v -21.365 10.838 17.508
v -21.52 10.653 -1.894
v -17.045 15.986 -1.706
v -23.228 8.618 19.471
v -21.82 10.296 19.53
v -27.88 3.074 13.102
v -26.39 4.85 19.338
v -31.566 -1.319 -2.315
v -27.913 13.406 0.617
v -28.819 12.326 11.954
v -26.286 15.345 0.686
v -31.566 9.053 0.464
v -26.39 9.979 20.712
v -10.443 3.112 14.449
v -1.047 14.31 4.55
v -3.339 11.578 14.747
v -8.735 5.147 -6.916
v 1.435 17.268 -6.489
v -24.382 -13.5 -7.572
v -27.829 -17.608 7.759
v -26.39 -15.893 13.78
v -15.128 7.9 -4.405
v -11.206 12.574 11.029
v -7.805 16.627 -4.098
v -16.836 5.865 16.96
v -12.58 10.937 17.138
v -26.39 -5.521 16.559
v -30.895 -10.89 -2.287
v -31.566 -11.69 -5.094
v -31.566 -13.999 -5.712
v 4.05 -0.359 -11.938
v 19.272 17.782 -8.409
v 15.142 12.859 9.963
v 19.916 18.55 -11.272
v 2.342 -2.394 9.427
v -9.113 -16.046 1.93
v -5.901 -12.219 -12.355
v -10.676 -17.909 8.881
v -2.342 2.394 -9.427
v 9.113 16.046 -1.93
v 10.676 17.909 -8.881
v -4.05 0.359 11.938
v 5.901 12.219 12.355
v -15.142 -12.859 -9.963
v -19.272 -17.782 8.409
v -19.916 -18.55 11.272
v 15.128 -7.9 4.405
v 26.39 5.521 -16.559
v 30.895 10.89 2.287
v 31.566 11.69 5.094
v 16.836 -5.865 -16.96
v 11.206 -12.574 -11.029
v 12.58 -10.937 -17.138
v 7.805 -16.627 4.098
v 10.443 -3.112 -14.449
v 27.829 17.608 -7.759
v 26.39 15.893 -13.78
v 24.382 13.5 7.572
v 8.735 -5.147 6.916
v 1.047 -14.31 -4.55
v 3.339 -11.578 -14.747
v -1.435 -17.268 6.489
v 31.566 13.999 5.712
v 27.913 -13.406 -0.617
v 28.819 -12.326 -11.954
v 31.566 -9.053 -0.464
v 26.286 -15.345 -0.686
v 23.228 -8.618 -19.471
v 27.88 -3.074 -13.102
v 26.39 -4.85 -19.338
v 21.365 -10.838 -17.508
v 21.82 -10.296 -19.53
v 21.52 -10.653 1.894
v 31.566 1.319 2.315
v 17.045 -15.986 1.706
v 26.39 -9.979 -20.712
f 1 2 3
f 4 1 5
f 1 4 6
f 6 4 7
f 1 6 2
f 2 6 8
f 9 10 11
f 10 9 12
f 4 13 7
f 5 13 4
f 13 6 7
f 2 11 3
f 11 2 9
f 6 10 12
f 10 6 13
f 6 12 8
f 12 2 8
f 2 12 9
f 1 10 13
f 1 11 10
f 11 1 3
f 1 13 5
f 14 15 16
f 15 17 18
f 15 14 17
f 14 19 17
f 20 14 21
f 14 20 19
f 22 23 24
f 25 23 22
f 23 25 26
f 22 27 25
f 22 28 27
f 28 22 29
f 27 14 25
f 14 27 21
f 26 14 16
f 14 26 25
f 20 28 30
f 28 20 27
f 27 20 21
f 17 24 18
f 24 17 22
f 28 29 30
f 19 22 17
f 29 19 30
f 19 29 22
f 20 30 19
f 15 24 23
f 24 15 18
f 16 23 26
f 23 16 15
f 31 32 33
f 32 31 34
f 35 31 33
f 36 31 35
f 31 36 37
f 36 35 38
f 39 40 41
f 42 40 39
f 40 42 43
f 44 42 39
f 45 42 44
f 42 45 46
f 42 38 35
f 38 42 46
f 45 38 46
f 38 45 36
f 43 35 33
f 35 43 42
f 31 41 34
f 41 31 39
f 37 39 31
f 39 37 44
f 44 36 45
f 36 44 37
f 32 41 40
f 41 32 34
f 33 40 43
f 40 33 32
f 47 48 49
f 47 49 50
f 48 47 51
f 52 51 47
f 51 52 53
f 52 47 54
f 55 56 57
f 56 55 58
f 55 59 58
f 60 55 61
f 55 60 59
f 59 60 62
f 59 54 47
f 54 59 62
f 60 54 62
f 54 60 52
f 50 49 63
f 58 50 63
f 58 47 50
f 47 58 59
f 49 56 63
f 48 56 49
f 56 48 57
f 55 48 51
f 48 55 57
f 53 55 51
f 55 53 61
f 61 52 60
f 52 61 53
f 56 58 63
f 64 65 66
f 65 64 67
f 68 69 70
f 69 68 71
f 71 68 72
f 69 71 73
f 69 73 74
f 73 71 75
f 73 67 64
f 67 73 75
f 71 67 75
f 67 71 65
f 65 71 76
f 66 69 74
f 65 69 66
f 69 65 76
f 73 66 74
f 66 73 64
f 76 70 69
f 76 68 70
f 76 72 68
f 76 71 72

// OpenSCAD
union(){
  // slice 1
  rotate(a=[0, 0, -40])
    intersection(){
      translate(v=[-43.333333333333336, 0, 0])
        translate(v=[0, -500, -500])
          cube(size=[6.666666666666671, 1000, 1000]);
      rotate(a=[0, 0, 40])
        rotate(a=[15, 0, 0])
          rotate(a=[0, 15, 0])
            translate(v=[-30, -15, -10])
              cube(size=[60, 30, 20]);
    }
  // slice 3
  rotate(a=[0, 0, -40])
    intersection(){
      translate(v=[-30, 0, 0])
        translate(v=[0, -500, -500])
          cube(size=[6.666666666666668, 1000, 1000]);
      rotate(a=[0, 0, 40])
        rotate(a=[15, 0, 0])
          rotate(a=[0, 15, 0])
            translate(v=[-30, -15, -10])
              cube(size=[60, 30, 20]);
    }
  // slice 5
  rotate(a=[0, 0, -40])
    intersection(){
      translate(v=[-16.666666666666664, 0, 0])
        translate(v=[0, -500, -500])
          cube(size=[6.666666666666664, 1000, 1000]);
      rotate(a=[0, 0, 40])
        rotate(a=[15, 0, 0])
          rotate(a=[0, 15, 0])
            translate(v=[-30, -15, -10])
              cube(size=[60, 30, 20]);
    }
  // slice 7
  rotate(a=[0, 0, -40])
    intersection(){
      translate(v=[-3.3333333333333286, 0, 0])
        translate(v=[0, -500, -500])
          cube(size=[6.666666666666664, 1000, 1000]);
      rotate(a=[0, 0, 40])
        rotate(a=[15, 0, 0])
          rotate(a=[0, 15, 0])
            translate(v=[-30, -15, -10])
              cube(size=[60, 30, 20]);
    }
  // slice 9
  rotate(a=[0, 0, -40])
    intersection(){
      translate(v=[10, 0, 0])
        translate(v=[0, -500, -500])
          cube(size=[6.666666666666671, 1000, 1000]);
      rotate(a=[0, 0, 40])
        rotate(a=[15, 0, 0])
          rotate(a=[0, 15, 0])
            translate(v=[-30, -15, -10])
              cube(size=[60, 30, 20]);
    }
  // slice 11
  rotate(a=[0, 0, -40])
    intersection(){
      translate(v=[23.333333333333343, 0, 0])
        translate(v=[0, -500, -500])
          cube(size=[6.666666666666657, 1000, 1000]);
      rotate(a=[0, 0, 40])
        rotate(a=[15, 0, 0])
          rotate(a=[0, 15, 0])
            translate(v=[-30, -15, -10])
              cube(size=[60, 30, 20]);
    }
  // slice 13
  rotate(a=[0, 0, -40])
    intersection(){
      translate(v=[36.66666666666667, 0, 0])
        translate(v=[0, -500, -500])
          cube(size=[6.666666666666671, 1000, 1000]);
      rotate(a=[0, 0, 40])
        rotate(a=[15, 0, 0])
          rotate(a=[0, 15, 0])
            translate(v=[-30, -15, -10])
              cube(size=[60, 30, 20]);
    }
}
